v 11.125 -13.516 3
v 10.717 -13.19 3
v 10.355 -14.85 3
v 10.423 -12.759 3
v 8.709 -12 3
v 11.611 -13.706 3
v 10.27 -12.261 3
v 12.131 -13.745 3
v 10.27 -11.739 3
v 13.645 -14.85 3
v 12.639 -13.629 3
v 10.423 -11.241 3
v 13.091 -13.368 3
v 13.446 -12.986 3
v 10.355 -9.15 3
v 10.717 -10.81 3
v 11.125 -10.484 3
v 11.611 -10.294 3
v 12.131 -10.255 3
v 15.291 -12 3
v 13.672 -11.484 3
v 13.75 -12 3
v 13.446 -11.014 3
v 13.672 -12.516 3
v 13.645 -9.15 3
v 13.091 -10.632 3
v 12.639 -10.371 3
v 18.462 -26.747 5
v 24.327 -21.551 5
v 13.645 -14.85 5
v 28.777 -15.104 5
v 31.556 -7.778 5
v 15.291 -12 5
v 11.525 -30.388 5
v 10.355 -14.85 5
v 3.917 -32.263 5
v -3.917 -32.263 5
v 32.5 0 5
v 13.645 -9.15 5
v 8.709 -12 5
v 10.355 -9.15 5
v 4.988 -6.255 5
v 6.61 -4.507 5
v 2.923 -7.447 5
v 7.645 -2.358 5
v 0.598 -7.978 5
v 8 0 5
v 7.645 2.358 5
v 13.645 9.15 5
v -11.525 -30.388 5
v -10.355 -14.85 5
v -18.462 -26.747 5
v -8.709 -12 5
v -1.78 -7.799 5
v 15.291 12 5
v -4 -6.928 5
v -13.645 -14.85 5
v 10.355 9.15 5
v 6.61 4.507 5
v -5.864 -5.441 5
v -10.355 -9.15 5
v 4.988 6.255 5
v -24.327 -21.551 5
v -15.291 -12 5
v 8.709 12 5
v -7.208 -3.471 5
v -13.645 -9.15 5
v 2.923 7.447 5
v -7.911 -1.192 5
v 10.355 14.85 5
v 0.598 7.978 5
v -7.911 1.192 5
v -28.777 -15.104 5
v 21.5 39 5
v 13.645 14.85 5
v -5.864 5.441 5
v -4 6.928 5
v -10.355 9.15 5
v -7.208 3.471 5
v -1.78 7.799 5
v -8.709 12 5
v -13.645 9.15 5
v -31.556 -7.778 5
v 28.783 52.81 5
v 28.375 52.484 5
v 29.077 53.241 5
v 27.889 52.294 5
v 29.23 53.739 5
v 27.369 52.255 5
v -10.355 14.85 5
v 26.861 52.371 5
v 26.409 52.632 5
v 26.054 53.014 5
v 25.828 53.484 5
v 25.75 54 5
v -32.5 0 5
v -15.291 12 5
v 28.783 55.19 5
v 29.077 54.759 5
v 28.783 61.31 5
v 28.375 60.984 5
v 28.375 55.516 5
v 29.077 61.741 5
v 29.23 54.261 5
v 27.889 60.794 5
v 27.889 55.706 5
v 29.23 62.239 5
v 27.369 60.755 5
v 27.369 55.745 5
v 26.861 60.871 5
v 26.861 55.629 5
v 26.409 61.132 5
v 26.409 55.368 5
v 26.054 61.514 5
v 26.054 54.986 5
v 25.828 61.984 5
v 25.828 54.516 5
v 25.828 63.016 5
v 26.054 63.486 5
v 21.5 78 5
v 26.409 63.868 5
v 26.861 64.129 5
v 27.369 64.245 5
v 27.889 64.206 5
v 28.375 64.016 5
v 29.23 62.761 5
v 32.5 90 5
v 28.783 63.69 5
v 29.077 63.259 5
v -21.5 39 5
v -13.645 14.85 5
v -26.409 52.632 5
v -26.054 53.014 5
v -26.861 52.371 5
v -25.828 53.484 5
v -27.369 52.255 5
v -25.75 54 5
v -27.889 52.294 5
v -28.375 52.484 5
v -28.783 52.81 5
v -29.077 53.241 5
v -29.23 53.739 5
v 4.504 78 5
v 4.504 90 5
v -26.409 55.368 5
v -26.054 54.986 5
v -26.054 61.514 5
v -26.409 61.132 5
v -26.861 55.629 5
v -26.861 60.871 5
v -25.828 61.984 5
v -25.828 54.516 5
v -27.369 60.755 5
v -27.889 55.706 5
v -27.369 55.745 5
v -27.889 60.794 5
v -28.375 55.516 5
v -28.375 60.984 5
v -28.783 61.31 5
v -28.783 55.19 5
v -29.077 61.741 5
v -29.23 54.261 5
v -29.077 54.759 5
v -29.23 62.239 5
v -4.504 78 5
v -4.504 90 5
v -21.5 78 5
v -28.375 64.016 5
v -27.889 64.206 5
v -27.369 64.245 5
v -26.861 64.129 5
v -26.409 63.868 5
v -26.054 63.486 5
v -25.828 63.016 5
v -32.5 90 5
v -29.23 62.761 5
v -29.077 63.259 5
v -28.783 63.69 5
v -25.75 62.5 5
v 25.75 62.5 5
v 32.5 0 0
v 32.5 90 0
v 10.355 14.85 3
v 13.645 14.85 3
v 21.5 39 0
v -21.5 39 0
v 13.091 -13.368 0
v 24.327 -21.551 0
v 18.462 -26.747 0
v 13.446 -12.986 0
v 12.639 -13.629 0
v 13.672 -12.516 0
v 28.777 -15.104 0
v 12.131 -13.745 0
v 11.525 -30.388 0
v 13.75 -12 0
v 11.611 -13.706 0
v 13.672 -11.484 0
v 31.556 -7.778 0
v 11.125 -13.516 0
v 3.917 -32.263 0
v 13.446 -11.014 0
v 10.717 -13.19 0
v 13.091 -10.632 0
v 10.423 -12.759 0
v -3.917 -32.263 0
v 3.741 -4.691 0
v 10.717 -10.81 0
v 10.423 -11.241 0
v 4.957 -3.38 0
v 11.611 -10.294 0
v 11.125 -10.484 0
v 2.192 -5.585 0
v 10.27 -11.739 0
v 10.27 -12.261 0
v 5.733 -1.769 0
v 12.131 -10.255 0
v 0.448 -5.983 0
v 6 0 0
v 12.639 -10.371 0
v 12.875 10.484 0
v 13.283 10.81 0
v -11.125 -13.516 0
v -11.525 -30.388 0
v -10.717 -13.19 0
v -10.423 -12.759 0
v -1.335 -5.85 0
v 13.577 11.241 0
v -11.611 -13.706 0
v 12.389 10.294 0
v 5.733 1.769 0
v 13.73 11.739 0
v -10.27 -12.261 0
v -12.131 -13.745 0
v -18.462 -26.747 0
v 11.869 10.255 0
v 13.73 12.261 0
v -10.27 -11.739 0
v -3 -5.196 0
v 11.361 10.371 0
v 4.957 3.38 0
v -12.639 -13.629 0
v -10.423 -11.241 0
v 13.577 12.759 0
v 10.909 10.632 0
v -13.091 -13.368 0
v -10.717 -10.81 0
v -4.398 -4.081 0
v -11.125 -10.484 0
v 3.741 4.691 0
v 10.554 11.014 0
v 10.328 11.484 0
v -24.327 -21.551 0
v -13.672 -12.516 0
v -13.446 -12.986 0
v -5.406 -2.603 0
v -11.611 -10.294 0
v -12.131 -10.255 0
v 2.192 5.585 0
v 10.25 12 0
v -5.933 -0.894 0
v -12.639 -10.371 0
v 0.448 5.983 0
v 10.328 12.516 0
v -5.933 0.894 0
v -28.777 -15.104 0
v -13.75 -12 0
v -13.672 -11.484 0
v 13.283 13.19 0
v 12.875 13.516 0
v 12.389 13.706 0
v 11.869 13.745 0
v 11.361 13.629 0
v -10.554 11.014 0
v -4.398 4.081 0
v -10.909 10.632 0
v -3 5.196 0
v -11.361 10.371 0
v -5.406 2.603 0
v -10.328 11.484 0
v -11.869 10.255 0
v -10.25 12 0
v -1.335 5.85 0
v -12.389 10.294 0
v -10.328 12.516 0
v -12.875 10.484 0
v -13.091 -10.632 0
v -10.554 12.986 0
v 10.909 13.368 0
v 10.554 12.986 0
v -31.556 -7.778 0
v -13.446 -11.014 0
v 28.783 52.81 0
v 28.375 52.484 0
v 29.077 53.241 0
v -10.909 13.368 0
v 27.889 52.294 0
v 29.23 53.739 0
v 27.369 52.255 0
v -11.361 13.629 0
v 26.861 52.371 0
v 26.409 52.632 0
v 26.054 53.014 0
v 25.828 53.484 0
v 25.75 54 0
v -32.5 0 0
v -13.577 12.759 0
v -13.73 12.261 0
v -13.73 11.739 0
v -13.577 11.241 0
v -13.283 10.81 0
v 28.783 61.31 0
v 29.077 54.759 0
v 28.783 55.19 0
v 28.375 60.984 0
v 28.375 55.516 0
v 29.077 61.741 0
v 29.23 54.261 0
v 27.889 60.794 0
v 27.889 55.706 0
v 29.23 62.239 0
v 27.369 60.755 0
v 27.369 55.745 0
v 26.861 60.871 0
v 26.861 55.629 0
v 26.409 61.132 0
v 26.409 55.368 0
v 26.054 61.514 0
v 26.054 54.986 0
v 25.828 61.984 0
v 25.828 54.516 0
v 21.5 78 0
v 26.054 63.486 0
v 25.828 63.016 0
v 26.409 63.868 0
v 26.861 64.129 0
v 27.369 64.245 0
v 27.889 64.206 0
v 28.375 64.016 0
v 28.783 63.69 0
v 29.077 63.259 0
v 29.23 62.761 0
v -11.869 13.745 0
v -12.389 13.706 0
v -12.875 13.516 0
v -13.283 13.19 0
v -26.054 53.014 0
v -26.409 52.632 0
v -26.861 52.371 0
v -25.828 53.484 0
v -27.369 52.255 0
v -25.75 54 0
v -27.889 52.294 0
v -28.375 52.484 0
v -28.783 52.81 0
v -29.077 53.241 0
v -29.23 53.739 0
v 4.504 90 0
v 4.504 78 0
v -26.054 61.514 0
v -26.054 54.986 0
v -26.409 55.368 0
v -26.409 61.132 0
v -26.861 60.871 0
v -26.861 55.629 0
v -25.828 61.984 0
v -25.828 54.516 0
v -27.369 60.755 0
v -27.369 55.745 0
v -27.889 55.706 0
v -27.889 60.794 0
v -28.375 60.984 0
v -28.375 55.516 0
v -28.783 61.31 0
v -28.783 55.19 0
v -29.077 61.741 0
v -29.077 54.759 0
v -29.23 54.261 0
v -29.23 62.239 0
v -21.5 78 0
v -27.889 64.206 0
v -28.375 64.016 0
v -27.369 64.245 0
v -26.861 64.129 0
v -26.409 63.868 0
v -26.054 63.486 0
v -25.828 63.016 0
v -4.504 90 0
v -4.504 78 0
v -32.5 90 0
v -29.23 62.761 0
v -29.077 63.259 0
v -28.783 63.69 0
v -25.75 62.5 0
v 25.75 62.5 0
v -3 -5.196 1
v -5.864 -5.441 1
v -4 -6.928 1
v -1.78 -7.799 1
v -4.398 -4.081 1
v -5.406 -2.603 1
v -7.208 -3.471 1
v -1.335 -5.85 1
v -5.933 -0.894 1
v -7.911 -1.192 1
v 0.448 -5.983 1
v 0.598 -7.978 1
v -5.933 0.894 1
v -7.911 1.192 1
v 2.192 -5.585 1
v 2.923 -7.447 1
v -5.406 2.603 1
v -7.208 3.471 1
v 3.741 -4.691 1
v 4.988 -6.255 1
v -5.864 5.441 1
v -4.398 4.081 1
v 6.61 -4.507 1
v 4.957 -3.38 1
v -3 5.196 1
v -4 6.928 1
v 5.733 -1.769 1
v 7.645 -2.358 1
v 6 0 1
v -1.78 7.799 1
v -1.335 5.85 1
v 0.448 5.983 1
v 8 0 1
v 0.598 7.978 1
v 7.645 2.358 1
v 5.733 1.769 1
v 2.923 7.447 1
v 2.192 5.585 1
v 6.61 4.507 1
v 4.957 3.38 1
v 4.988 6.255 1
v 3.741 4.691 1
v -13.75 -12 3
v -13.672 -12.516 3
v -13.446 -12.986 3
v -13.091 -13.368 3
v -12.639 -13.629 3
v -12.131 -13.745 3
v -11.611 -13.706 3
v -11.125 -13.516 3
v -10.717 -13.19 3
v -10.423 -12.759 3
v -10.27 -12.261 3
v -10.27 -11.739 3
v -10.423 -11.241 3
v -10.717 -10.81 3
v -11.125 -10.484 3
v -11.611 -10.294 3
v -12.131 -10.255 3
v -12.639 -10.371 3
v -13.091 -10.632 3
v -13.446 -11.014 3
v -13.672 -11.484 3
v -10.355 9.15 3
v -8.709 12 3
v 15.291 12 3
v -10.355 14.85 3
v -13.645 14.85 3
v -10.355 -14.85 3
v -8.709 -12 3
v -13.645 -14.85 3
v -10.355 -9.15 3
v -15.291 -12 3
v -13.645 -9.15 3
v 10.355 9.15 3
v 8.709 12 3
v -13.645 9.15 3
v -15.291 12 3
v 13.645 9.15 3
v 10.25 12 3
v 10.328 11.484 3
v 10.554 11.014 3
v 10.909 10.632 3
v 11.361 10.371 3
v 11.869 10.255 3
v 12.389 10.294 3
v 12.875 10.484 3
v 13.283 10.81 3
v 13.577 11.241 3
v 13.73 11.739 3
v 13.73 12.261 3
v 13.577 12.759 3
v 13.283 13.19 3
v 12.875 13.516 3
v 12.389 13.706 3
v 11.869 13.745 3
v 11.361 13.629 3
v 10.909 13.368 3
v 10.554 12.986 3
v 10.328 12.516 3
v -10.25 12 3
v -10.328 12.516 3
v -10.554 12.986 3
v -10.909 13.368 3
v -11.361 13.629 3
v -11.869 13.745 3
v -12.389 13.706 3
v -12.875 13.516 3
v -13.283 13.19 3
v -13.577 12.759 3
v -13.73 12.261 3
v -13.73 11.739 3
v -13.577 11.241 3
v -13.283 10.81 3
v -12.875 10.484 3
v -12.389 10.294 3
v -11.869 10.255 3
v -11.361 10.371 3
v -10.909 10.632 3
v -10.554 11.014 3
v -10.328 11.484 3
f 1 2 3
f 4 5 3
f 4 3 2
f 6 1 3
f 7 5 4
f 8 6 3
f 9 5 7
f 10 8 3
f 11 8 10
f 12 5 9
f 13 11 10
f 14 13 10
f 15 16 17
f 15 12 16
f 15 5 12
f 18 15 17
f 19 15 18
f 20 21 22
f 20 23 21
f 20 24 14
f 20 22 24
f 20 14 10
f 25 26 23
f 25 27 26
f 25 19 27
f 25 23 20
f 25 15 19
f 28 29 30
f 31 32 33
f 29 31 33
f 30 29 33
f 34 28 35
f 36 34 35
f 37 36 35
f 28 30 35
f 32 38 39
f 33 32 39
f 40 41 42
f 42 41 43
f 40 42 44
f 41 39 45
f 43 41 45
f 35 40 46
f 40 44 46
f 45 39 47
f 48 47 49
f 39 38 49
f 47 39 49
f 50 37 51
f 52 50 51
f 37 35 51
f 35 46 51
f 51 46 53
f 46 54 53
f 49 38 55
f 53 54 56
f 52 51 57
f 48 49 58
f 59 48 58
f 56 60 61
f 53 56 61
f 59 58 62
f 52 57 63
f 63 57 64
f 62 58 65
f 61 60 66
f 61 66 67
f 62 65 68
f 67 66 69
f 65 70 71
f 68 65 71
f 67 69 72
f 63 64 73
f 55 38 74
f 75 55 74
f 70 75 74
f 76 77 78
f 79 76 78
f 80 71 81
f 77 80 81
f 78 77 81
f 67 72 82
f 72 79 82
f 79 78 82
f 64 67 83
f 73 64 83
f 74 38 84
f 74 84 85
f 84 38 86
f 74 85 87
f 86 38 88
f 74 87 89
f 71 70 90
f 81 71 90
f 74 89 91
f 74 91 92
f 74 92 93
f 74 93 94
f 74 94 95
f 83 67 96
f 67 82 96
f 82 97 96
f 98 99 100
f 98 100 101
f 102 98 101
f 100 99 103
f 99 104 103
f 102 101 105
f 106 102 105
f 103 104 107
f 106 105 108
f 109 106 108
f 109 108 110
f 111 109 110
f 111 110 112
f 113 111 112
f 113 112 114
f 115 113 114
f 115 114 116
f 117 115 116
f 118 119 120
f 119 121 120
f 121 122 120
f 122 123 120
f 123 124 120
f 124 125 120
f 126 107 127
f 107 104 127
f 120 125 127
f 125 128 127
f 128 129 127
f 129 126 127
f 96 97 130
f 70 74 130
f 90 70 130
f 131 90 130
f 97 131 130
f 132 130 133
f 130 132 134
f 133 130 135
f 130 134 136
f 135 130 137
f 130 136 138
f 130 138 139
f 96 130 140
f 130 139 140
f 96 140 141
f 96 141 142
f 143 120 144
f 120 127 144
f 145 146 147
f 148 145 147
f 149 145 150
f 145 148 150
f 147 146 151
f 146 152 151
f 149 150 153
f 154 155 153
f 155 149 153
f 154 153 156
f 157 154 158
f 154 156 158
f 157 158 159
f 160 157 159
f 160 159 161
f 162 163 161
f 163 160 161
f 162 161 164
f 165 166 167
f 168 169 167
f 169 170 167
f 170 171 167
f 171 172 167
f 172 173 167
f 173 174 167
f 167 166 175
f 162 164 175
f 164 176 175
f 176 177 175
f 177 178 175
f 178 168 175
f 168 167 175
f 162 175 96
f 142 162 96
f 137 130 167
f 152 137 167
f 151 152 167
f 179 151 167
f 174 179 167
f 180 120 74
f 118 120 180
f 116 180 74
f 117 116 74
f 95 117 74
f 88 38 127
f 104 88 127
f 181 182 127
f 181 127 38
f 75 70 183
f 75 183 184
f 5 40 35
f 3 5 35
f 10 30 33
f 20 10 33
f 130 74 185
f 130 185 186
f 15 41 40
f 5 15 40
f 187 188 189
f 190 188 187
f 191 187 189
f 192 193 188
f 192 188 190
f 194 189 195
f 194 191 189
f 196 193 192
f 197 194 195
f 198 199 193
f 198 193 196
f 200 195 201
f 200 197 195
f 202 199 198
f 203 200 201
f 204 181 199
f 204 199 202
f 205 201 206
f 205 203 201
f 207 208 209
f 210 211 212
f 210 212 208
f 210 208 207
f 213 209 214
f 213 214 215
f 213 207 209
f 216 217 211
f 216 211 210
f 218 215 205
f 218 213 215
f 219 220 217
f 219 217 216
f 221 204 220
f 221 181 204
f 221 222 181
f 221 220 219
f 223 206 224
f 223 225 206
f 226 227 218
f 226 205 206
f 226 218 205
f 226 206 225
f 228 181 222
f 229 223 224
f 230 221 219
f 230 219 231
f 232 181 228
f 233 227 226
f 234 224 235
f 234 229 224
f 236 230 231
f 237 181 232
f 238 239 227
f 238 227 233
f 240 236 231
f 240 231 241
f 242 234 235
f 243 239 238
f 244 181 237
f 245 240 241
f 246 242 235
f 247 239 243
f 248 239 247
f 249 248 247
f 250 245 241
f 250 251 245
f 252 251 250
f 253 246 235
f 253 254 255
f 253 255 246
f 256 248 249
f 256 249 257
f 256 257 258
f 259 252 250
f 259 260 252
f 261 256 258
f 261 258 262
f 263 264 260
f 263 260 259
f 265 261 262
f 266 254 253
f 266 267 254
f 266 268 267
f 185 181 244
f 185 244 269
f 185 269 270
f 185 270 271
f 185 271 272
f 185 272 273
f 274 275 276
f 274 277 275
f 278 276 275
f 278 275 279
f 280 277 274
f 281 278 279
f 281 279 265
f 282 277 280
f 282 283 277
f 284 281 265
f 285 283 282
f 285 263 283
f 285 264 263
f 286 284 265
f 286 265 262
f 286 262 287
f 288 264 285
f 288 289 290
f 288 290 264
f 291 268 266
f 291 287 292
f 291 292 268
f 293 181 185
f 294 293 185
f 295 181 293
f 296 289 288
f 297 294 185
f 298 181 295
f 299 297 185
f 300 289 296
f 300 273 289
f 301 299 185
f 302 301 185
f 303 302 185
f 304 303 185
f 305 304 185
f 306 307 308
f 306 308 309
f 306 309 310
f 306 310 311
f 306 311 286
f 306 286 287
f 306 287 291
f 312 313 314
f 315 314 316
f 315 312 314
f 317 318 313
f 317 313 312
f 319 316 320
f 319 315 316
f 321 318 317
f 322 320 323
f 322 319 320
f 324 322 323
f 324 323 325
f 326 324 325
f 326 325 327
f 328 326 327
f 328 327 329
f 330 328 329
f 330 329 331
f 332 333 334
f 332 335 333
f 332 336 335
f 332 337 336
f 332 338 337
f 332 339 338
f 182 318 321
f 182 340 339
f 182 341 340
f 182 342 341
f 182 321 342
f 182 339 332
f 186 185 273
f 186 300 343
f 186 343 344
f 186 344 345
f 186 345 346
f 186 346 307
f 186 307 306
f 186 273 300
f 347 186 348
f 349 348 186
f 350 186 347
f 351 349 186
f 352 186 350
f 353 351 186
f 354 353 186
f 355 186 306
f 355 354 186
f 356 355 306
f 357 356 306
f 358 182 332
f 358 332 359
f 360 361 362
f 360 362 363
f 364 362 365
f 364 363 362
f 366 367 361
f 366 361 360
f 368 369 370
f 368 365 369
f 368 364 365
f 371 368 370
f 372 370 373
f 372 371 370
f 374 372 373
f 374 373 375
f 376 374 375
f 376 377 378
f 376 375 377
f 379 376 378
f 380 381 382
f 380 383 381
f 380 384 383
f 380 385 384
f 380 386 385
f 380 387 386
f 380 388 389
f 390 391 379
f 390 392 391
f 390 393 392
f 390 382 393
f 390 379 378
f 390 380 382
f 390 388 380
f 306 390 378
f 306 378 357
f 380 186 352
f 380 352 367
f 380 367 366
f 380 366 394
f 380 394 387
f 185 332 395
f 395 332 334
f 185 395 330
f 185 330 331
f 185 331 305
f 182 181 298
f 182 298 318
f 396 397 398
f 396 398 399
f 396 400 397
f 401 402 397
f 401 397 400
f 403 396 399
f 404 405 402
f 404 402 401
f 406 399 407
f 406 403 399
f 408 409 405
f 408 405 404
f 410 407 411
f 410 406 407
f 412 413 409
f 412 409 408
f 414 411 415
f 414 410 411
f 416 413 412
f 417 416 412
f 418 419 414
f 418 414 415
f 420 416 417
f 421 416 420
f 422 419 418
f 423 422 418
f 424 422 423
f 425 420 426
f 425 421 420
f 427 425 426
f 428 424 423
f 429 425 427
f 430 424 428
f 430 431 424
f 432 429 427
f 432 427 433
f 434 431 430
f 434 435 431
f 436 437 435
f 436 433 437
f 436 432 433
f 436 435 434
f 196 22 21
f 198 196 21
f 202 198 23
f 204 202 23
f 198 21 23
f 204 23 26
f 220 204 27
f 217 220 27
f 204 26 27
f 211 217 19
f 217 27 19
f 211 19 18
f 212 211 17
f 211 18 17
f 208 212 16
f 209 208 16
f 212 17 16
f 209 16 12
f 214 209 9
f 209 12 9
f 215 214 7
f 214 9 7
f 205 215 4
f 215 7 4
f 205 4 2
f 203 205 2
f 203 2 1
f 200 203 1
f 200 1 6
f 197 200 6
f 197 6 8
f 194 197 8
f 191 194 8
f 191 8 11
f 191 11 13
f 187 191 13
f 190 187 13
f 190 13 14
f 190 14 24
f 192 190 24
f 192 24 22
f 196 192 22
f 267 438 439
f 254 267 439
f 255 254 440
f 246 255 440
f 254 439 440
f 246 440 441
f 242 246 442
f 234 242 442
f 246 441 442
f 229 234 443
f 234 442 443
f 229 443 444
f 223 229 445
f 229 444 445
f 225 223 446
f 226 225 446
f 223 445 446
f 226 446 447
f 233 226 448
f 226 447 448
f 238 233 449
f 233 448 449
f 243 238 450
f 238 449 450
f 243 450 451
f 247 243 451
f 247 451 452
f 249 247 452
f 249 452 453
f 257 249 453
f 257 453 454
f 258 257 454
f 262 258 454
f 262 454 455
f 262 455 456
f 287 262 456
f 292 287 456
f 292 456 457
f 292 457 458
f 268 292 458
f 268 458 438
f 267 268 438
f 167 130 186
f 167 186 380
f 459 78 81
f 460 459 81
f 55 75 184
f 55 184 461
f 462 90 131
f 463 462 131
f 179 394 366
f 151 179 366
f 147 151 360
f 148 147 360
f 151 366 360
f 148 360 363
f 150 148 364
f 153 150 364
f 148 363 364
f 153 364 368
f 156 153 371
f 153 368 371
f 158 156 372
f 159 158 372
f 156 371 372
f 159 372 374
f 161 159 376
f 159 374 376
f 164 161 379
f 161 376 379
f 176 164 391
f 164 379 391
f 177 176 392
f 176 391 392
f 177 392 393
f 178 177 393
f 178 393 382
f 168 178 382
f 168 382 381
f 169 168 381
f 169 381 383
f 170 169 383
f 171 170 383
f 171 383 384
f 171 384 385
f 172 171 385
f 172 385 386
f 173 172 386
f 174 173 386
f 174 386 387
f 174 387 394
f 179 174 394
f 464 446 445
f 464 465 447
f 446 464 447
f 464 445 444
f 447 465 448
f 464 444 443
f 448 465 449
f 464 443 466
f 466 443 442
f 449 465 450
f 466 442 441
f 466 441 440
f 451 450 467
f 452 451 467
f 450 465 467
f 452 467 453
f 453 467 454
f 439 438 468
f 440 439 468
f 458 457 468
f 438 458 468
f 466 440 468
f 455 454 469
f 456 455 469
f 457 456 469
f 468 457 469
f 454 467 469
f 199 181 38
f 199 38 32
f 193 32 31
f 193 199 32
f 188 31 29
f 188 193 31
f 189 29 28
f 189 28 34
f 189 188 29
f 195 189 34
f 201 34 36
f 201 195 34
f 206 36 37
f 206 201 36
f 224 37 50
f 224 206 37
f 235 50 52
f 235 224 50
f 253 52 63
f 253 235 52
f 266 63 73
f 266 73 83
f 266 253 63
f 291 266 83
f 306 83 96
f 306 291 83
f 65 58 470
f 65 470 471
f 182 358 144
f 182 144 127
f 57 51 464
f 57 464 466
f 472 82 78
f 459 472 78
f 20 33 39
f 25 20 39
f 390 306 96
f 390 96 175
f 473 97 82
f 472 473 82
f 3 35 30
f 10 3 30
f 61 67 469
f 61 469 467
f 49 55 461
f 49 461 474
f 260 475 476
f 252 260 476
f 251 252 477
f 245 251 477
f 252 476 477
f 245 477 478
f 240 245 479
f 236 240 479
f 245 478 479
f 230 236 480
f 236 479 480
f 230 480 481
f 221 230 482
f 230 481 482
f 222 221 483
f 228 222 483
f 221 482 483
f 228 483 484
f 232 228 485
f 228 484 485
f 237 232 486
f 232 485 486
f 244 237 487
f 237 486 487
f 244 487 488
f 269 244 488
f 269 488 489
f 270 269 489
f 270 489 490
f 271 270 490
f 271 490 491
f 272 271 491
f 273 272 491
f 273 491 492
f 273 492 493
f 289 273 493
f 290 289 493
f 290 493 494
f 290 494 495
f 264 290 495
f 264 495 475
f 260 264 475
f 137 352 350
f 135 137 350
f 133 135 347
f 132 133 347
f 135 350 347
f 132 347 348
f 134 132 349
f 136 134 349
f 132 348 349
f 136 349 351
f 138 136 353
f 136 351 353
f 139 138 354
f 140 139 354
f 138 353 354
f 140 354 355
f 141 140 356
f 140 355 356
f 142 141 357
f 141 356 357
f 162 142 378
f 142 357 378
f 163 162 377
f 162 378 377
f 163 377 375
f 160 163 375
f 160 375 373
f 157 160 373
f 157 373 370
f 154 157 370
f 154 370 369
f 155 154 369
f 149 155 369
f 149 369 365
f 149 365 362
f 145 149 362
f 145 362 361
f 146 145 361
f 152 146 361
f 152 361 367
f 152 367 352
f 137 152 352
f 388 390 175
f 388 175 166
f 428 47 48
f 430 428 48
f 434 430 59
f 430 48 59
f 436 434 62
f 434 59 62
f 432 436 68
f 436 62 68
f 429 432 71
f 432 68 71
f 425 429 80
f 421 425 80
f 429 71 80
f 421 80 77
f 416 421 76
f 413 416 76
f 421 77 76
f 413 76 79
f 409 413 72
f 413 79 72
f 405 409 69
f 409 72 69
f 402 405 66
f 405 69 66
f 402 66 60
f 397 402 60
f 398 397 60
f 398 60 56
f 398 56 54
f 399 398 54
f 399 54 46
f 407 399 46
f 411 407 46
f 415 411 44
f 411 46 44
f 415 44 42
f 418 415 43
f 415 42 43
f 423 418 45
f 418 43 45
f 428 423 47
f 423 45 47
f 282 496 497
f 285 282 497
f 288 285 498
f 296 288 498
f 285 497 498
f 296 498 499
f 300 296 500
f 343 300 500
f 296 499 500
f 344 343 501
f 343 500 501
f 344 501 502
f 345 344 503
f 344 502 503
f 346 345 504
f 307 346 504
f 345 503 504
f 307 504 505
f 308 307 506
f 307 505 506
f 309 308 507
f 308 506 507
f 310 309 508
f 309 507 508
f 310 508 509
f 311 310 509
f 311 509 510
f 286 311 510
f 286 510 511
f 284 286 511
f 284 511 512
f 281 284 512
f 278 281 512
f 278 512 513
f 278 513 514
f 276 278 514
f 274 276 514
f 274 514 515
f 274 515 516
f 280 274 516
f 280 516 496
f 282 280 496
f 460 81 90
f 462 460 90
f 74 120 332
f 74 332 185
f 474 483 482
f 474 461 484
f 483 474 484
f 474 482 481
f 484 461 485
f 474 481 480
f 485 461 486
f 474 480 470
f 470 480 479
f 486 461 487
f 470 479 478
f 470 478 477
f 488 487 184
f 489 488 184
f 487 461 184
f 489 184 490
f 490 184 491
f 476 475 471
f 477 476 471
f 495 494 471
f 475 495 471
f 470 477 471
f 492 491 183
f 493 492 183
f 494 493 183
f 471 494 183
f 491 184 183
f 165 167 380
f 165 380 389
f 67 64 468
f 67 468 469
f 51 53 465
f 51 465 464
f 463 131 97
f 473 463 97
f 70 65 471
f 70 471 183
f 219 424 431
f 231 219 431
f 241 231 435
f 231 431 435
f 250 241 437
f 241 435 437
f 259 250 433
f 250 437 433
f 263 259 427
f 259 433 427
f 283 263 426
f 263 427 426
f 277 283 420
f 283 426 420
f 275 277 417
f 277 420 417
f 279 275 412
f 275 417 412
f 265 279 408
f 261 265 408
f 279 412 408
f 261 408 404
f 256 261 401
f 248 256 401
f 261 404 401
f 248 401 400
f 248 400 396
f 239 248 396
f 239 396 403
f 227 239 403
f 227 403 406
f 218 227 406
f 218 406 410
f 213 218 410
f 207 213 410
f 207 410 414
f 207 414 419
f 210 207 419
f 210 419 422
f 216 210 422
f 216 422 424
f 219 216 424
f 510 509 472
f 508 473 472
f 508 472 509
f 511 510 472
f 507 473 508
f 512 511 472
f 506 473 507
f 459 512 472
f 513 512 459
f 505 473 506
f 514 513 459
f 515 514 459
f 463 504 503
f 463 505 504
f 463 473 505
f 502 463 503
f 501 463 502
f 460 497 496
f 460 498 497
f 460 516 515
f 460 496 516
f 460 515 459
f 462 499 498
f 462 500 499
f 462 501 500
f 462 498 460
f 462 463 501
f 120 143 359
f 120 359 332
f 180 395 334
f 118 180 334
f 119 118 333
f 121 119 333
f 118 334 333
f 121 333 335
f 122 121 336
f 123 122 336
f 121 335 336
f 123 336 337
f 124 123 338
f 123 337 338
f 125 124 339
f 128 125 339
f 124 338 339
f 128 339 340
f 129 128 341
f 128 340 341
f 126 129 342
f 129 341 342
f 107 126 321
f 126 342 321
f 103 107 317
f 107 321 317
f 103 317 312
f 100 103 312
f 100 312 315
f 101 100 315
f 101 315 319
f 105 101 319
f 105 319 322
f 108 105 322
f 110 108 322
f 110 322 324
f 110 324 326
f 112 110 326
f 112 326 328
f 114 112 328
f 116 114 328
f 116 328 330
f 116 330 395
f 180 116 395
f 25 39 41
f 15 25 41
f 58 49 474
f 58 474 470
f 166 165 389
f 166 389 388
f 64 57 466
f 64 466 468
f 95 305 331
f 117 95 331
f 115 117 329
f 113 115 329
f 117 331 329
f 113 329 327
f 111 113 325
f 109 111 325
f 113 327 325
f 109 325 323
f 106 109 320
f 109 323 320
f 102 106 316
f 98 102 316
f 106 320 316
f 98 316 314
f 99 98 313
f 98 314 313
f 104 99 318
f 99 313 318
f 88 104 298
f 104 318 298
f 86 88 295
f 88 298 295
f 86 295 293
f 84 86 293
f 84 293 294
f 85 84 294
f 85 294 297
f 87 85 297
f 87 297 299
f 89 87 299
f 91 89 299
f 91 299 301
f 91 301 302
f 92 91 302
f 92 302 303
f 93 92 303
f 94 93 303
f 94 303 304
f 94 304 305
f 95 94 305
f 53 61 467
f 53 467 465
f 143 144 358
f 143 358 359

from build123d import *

# Parameters (mm, degrees)
BOSS_EXTRUDE1_DEPTH = 5
SKETCH2_R           = 6
CUT_EXTRUDE1_DEPTH  = 96.818839484
SKETCH3_R           = 8
CUT_EXTRUDE2_DEPTH  = 4
SKETCH4_R           = 1.75
CUT_EXTRUDE3_DEPTH  = 96.818839484
CUT_EXTRUDE4_DEPTH  = 96.818839484
CUT_EXTRUDE6_DEPTH  = 2
SKETCH8_R           = 1.75
CUT_EXTRUDE7_DEPTH  = 96.818839484


with BuildPart() as part:
    # Sketch1 → Boss-Extrude1 (new body)
    with BuildSketch(Plane.XY):
        with BuildLine():
            Line((-32.5, 0), (-32.5, 90))
            Line((-32.5, 90), (32.5, 90))
            Line((32.5, 90), (32.5, 0))
            ThreePointArc((32.5, 0), (0, -32.5), (-32.5, 0))
        make_face()
    extrude(amount=BOSS_EXTRUDE1_DEPTH)

    # Sketch2 → Cut-Extrude1 (cut, through all)
    with BuildSketch(Plane.XY.offset(5)):
        Circle(SKETCH2_R)
    extrude(amount=-CUT_EXTRUDE1_DEPTH, mode=Mode.SUBTRACT)

    # Sketch3 → Cut-Extrude2 (cut)
    with BuildSketch(Plane.XY.offset(5)):
        Circle(SKETCH3_R)
    extrude(amount=-CUT_EXTRUDE2_DEPTH, mode=Mode.SUBTRACT)

    # Sketch4 → Cut-Extrude3 (cut, through all)
    with BuildSketch(Plane.XY.offset(5)):
        with Locations((-12, 12)):
            Circle(SKETCH4_R)
        with Locations(Location((12, 12, 0), (0, 0, 180))):
            Circle(SKETCH4_R)
        with Locations((12, -12)):
            Circle(SKETCH4_R)
        with Locations(Location((-12, -12, 0), (0, 0, 180))):
            Circle(SKETCH4_R)
    extrude(amount=-CUT_EXTRUDE3_DEPTH, mode=Mode.SUBTRACT)

    # Sketch5 → Cut-Extrude4 (cut, through all)
    with BuildSketch(Plane.XY.offset(5)):
        Polygon((-21.5, 78), (-4.504076159, 78), (-4.504076159, 90), (4.504076159, 90), (4.504076159, 78), (21.5, 78), (21.5, 39), (-21.5, 39), align=None)
    extrude(amount=-CUT_EXTRUDE4_DEPTH, mode=Mode.SUBTRACT)

    # Sketch7 → Cut-Extrude6 (cut)
    with BuildSketch(Plane.XY.offset(5)):
        Polygon((-8.709103466, 12), (-10.354551733, 14.85), (-13.645448267, 14.85), (-15.290896534, 12), (-13.645448267, 9.15), (-10.354551733, 9.15), align=None)
        Polygon((10.354551733, 9.15), (8.709103466, 12), (10.354551733, 14.85), (13.645448267, 14.85), (15.290896534, 12), (13.645448267, 9.15), align=None)
        Polygon((8.709103466, -12), (10.354551733, -14.85), (13.645448267, -14.85), (15.290896534, -12), (13.645448267, -9.15), (10.354551733, -9.15), align=None)
        Polygon((-10.354551733, -9.15), (-8.709103466, -12), (-10.354551733, -14.85), (-13.645448267, -14.85), (-15.290896534, -12), (-13.645448267, -9.15), align=None)
    extrude(amount=-CUT_EXTRUDE6_DEPTH, mode=Mode.SUBTRACT)

    # Sketch8 → Cut-Extrude7 (cut, through all)
    with BuildSketch(Plane(origin=(0, 0, 0), x_dir=(-1, 0, 0), z_dir=(0, 0, -1))):
        with Locations((-27.5, 62.5)):
            Circle(SKETCH8_R)
        with Locations((-27.5, 54)):
            Circle(SKETCH8_R)
        with Locations(Location((27.5, 54, 0), (0, 0, 180))):
            Circle(SKETCH8_R)
        with Locations(Location((27.5, 62.5, 0), (0, 0, 180))):
            Circle(SKETCH8_R)
    extrude(amount=-CUT_EXTRUDE7_DEPTH, mode=Mode.SUBTRACT)


solid = part.part
